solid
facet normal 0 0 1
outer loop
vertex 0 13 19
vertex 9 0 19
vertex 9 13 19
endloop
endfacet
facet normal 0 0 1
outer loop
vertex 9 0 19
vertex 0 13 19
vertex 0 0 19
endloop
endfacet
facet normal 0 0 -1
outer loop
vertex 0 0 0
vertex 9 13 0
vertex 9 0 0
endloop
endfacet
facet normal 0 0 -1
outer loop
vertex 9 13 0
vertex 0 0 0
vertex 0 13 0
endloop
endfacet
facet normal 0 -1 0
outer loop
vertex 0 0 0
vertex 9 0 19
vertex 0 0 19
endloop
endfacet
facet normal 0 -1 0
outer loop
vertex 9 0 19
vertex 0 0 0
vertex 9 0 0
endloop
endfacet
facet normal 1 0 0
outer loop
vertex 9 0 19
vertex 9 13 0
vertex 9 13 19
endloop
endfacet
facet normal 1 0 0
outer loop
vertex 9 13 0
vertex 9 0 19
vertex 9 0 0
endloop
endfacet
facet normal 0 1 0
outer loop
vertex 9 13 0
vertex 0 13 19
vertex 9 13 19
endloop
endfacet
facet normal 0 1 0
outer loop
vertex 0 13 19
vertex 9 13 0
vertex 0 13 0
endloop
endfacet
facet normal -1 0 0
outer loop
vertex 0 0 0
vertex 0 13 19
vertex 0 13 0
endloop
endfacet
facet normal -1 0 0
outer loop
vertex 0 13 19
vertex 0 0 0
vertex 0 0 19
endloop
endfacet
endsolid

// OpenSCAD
// Generated by SolidPython 1.0.1 on 2020-07-29 00:39:26


cube(size = [9, 13, 19]);
/***********************************************
*********      SolidPython code:      **********
************************************************
 
# import packages: SolidPython
from solid import *
from solid.utils import *
from itertools import chain, combinations


class Resize:

    def __init__(self, scad_file):
        self.scad_file = scad_file
        #self.scad_file = import_scad(scad_file)
        # cone/cylinder param:
        self.r1 = 0
        self.r2 = 0
        self.h = 0
        # rectangular prism param:
        self.w = 0
        self.l = 0
        # ellipse param:
        self.r = 0

    # import OpenScad code (file name corresponds to shape)


    # classify shape + parameters
    def assign(self, param1, param2, param3):
        if self.scad_file == 'cone.scad':
            self.r1 = param1
            self.r2 = param2
            self.h = param3
        elif self.scad_file == 'cylinder.scad':
            self.r1 = param1
            self.r2 = param2
            self.h = param3
        elif self.scad_file == 'rectangularPrism.scad':
            self.h = param1
            self.l = param2
            self.w = param3
        else:
            self.r = param1
            self.h = param2

    # resize parameters
    def iterate(self):
        x = range(3, 20, 2)
        i = 1
        if self.scad_file == 'cone.scad':
            tempList = list(combinations(x, 2))
            for temp in tempList:
                param1 = temp[0]
                param2 = temp[1]
                filepath = 'produced_scad_files/' + 'cone' + str(param1) + '_' + str(param2) + '_' + '.scad'
                scad_render_to_file(cylinder(h=param1, r1=param2, r2=0), filepath)

        elif self.scad_file == 'cylinder.scad':
            tempList = list(combinations(x, 3))
            for temp in tempList:
                param1 = temp[0]
                param2 = temp[1]
                filepath = 'produced_scad_files/' + 'cylinder' + str(param1) + '_' + str(param2) + '_' + '.scad'
                scad_render_to_file(cylinder(h=param1, r1=param2, r2=param2), filepath)

        elif self.scad_file == 'rectangularPrism.scad':
            tempList = list(combinations(x, 3))
            for temp in tempList:
                param1 = temp[0]
                param2 = temp[1]
                param3 = temp[2]
                filepath = 'produced_scad_files/' + 'rectangularPrism' + str(param1) + '_' + str(param2) + '_' + str(
                    param3) + '.scad'
                scad_render_to_file(cube(size=(param1, param2, param3)), filepath)

        elif self.scad_file == 'ellipse.scad':
            tempList = list(combinations(x, 4))
            for temp in tempList:
                param1 = temp[0]
                param2 = temp[1]
                param3 = temp[2]
                param4 = temp[3]
                filepath = 'produced_scad_files/' + 'ellipse' + str(param1) + '_' + str(param2) + '_' + str(param3) + '_' + str(param4) + '.scad'
                scad_render_to_file(scale([param1, param2, param3])(sphere(r=param4)), filepath)

    def render_to_scadfile(self):
        scad_render_to_file(scad, 'example.scad') 
 
************************************************/
